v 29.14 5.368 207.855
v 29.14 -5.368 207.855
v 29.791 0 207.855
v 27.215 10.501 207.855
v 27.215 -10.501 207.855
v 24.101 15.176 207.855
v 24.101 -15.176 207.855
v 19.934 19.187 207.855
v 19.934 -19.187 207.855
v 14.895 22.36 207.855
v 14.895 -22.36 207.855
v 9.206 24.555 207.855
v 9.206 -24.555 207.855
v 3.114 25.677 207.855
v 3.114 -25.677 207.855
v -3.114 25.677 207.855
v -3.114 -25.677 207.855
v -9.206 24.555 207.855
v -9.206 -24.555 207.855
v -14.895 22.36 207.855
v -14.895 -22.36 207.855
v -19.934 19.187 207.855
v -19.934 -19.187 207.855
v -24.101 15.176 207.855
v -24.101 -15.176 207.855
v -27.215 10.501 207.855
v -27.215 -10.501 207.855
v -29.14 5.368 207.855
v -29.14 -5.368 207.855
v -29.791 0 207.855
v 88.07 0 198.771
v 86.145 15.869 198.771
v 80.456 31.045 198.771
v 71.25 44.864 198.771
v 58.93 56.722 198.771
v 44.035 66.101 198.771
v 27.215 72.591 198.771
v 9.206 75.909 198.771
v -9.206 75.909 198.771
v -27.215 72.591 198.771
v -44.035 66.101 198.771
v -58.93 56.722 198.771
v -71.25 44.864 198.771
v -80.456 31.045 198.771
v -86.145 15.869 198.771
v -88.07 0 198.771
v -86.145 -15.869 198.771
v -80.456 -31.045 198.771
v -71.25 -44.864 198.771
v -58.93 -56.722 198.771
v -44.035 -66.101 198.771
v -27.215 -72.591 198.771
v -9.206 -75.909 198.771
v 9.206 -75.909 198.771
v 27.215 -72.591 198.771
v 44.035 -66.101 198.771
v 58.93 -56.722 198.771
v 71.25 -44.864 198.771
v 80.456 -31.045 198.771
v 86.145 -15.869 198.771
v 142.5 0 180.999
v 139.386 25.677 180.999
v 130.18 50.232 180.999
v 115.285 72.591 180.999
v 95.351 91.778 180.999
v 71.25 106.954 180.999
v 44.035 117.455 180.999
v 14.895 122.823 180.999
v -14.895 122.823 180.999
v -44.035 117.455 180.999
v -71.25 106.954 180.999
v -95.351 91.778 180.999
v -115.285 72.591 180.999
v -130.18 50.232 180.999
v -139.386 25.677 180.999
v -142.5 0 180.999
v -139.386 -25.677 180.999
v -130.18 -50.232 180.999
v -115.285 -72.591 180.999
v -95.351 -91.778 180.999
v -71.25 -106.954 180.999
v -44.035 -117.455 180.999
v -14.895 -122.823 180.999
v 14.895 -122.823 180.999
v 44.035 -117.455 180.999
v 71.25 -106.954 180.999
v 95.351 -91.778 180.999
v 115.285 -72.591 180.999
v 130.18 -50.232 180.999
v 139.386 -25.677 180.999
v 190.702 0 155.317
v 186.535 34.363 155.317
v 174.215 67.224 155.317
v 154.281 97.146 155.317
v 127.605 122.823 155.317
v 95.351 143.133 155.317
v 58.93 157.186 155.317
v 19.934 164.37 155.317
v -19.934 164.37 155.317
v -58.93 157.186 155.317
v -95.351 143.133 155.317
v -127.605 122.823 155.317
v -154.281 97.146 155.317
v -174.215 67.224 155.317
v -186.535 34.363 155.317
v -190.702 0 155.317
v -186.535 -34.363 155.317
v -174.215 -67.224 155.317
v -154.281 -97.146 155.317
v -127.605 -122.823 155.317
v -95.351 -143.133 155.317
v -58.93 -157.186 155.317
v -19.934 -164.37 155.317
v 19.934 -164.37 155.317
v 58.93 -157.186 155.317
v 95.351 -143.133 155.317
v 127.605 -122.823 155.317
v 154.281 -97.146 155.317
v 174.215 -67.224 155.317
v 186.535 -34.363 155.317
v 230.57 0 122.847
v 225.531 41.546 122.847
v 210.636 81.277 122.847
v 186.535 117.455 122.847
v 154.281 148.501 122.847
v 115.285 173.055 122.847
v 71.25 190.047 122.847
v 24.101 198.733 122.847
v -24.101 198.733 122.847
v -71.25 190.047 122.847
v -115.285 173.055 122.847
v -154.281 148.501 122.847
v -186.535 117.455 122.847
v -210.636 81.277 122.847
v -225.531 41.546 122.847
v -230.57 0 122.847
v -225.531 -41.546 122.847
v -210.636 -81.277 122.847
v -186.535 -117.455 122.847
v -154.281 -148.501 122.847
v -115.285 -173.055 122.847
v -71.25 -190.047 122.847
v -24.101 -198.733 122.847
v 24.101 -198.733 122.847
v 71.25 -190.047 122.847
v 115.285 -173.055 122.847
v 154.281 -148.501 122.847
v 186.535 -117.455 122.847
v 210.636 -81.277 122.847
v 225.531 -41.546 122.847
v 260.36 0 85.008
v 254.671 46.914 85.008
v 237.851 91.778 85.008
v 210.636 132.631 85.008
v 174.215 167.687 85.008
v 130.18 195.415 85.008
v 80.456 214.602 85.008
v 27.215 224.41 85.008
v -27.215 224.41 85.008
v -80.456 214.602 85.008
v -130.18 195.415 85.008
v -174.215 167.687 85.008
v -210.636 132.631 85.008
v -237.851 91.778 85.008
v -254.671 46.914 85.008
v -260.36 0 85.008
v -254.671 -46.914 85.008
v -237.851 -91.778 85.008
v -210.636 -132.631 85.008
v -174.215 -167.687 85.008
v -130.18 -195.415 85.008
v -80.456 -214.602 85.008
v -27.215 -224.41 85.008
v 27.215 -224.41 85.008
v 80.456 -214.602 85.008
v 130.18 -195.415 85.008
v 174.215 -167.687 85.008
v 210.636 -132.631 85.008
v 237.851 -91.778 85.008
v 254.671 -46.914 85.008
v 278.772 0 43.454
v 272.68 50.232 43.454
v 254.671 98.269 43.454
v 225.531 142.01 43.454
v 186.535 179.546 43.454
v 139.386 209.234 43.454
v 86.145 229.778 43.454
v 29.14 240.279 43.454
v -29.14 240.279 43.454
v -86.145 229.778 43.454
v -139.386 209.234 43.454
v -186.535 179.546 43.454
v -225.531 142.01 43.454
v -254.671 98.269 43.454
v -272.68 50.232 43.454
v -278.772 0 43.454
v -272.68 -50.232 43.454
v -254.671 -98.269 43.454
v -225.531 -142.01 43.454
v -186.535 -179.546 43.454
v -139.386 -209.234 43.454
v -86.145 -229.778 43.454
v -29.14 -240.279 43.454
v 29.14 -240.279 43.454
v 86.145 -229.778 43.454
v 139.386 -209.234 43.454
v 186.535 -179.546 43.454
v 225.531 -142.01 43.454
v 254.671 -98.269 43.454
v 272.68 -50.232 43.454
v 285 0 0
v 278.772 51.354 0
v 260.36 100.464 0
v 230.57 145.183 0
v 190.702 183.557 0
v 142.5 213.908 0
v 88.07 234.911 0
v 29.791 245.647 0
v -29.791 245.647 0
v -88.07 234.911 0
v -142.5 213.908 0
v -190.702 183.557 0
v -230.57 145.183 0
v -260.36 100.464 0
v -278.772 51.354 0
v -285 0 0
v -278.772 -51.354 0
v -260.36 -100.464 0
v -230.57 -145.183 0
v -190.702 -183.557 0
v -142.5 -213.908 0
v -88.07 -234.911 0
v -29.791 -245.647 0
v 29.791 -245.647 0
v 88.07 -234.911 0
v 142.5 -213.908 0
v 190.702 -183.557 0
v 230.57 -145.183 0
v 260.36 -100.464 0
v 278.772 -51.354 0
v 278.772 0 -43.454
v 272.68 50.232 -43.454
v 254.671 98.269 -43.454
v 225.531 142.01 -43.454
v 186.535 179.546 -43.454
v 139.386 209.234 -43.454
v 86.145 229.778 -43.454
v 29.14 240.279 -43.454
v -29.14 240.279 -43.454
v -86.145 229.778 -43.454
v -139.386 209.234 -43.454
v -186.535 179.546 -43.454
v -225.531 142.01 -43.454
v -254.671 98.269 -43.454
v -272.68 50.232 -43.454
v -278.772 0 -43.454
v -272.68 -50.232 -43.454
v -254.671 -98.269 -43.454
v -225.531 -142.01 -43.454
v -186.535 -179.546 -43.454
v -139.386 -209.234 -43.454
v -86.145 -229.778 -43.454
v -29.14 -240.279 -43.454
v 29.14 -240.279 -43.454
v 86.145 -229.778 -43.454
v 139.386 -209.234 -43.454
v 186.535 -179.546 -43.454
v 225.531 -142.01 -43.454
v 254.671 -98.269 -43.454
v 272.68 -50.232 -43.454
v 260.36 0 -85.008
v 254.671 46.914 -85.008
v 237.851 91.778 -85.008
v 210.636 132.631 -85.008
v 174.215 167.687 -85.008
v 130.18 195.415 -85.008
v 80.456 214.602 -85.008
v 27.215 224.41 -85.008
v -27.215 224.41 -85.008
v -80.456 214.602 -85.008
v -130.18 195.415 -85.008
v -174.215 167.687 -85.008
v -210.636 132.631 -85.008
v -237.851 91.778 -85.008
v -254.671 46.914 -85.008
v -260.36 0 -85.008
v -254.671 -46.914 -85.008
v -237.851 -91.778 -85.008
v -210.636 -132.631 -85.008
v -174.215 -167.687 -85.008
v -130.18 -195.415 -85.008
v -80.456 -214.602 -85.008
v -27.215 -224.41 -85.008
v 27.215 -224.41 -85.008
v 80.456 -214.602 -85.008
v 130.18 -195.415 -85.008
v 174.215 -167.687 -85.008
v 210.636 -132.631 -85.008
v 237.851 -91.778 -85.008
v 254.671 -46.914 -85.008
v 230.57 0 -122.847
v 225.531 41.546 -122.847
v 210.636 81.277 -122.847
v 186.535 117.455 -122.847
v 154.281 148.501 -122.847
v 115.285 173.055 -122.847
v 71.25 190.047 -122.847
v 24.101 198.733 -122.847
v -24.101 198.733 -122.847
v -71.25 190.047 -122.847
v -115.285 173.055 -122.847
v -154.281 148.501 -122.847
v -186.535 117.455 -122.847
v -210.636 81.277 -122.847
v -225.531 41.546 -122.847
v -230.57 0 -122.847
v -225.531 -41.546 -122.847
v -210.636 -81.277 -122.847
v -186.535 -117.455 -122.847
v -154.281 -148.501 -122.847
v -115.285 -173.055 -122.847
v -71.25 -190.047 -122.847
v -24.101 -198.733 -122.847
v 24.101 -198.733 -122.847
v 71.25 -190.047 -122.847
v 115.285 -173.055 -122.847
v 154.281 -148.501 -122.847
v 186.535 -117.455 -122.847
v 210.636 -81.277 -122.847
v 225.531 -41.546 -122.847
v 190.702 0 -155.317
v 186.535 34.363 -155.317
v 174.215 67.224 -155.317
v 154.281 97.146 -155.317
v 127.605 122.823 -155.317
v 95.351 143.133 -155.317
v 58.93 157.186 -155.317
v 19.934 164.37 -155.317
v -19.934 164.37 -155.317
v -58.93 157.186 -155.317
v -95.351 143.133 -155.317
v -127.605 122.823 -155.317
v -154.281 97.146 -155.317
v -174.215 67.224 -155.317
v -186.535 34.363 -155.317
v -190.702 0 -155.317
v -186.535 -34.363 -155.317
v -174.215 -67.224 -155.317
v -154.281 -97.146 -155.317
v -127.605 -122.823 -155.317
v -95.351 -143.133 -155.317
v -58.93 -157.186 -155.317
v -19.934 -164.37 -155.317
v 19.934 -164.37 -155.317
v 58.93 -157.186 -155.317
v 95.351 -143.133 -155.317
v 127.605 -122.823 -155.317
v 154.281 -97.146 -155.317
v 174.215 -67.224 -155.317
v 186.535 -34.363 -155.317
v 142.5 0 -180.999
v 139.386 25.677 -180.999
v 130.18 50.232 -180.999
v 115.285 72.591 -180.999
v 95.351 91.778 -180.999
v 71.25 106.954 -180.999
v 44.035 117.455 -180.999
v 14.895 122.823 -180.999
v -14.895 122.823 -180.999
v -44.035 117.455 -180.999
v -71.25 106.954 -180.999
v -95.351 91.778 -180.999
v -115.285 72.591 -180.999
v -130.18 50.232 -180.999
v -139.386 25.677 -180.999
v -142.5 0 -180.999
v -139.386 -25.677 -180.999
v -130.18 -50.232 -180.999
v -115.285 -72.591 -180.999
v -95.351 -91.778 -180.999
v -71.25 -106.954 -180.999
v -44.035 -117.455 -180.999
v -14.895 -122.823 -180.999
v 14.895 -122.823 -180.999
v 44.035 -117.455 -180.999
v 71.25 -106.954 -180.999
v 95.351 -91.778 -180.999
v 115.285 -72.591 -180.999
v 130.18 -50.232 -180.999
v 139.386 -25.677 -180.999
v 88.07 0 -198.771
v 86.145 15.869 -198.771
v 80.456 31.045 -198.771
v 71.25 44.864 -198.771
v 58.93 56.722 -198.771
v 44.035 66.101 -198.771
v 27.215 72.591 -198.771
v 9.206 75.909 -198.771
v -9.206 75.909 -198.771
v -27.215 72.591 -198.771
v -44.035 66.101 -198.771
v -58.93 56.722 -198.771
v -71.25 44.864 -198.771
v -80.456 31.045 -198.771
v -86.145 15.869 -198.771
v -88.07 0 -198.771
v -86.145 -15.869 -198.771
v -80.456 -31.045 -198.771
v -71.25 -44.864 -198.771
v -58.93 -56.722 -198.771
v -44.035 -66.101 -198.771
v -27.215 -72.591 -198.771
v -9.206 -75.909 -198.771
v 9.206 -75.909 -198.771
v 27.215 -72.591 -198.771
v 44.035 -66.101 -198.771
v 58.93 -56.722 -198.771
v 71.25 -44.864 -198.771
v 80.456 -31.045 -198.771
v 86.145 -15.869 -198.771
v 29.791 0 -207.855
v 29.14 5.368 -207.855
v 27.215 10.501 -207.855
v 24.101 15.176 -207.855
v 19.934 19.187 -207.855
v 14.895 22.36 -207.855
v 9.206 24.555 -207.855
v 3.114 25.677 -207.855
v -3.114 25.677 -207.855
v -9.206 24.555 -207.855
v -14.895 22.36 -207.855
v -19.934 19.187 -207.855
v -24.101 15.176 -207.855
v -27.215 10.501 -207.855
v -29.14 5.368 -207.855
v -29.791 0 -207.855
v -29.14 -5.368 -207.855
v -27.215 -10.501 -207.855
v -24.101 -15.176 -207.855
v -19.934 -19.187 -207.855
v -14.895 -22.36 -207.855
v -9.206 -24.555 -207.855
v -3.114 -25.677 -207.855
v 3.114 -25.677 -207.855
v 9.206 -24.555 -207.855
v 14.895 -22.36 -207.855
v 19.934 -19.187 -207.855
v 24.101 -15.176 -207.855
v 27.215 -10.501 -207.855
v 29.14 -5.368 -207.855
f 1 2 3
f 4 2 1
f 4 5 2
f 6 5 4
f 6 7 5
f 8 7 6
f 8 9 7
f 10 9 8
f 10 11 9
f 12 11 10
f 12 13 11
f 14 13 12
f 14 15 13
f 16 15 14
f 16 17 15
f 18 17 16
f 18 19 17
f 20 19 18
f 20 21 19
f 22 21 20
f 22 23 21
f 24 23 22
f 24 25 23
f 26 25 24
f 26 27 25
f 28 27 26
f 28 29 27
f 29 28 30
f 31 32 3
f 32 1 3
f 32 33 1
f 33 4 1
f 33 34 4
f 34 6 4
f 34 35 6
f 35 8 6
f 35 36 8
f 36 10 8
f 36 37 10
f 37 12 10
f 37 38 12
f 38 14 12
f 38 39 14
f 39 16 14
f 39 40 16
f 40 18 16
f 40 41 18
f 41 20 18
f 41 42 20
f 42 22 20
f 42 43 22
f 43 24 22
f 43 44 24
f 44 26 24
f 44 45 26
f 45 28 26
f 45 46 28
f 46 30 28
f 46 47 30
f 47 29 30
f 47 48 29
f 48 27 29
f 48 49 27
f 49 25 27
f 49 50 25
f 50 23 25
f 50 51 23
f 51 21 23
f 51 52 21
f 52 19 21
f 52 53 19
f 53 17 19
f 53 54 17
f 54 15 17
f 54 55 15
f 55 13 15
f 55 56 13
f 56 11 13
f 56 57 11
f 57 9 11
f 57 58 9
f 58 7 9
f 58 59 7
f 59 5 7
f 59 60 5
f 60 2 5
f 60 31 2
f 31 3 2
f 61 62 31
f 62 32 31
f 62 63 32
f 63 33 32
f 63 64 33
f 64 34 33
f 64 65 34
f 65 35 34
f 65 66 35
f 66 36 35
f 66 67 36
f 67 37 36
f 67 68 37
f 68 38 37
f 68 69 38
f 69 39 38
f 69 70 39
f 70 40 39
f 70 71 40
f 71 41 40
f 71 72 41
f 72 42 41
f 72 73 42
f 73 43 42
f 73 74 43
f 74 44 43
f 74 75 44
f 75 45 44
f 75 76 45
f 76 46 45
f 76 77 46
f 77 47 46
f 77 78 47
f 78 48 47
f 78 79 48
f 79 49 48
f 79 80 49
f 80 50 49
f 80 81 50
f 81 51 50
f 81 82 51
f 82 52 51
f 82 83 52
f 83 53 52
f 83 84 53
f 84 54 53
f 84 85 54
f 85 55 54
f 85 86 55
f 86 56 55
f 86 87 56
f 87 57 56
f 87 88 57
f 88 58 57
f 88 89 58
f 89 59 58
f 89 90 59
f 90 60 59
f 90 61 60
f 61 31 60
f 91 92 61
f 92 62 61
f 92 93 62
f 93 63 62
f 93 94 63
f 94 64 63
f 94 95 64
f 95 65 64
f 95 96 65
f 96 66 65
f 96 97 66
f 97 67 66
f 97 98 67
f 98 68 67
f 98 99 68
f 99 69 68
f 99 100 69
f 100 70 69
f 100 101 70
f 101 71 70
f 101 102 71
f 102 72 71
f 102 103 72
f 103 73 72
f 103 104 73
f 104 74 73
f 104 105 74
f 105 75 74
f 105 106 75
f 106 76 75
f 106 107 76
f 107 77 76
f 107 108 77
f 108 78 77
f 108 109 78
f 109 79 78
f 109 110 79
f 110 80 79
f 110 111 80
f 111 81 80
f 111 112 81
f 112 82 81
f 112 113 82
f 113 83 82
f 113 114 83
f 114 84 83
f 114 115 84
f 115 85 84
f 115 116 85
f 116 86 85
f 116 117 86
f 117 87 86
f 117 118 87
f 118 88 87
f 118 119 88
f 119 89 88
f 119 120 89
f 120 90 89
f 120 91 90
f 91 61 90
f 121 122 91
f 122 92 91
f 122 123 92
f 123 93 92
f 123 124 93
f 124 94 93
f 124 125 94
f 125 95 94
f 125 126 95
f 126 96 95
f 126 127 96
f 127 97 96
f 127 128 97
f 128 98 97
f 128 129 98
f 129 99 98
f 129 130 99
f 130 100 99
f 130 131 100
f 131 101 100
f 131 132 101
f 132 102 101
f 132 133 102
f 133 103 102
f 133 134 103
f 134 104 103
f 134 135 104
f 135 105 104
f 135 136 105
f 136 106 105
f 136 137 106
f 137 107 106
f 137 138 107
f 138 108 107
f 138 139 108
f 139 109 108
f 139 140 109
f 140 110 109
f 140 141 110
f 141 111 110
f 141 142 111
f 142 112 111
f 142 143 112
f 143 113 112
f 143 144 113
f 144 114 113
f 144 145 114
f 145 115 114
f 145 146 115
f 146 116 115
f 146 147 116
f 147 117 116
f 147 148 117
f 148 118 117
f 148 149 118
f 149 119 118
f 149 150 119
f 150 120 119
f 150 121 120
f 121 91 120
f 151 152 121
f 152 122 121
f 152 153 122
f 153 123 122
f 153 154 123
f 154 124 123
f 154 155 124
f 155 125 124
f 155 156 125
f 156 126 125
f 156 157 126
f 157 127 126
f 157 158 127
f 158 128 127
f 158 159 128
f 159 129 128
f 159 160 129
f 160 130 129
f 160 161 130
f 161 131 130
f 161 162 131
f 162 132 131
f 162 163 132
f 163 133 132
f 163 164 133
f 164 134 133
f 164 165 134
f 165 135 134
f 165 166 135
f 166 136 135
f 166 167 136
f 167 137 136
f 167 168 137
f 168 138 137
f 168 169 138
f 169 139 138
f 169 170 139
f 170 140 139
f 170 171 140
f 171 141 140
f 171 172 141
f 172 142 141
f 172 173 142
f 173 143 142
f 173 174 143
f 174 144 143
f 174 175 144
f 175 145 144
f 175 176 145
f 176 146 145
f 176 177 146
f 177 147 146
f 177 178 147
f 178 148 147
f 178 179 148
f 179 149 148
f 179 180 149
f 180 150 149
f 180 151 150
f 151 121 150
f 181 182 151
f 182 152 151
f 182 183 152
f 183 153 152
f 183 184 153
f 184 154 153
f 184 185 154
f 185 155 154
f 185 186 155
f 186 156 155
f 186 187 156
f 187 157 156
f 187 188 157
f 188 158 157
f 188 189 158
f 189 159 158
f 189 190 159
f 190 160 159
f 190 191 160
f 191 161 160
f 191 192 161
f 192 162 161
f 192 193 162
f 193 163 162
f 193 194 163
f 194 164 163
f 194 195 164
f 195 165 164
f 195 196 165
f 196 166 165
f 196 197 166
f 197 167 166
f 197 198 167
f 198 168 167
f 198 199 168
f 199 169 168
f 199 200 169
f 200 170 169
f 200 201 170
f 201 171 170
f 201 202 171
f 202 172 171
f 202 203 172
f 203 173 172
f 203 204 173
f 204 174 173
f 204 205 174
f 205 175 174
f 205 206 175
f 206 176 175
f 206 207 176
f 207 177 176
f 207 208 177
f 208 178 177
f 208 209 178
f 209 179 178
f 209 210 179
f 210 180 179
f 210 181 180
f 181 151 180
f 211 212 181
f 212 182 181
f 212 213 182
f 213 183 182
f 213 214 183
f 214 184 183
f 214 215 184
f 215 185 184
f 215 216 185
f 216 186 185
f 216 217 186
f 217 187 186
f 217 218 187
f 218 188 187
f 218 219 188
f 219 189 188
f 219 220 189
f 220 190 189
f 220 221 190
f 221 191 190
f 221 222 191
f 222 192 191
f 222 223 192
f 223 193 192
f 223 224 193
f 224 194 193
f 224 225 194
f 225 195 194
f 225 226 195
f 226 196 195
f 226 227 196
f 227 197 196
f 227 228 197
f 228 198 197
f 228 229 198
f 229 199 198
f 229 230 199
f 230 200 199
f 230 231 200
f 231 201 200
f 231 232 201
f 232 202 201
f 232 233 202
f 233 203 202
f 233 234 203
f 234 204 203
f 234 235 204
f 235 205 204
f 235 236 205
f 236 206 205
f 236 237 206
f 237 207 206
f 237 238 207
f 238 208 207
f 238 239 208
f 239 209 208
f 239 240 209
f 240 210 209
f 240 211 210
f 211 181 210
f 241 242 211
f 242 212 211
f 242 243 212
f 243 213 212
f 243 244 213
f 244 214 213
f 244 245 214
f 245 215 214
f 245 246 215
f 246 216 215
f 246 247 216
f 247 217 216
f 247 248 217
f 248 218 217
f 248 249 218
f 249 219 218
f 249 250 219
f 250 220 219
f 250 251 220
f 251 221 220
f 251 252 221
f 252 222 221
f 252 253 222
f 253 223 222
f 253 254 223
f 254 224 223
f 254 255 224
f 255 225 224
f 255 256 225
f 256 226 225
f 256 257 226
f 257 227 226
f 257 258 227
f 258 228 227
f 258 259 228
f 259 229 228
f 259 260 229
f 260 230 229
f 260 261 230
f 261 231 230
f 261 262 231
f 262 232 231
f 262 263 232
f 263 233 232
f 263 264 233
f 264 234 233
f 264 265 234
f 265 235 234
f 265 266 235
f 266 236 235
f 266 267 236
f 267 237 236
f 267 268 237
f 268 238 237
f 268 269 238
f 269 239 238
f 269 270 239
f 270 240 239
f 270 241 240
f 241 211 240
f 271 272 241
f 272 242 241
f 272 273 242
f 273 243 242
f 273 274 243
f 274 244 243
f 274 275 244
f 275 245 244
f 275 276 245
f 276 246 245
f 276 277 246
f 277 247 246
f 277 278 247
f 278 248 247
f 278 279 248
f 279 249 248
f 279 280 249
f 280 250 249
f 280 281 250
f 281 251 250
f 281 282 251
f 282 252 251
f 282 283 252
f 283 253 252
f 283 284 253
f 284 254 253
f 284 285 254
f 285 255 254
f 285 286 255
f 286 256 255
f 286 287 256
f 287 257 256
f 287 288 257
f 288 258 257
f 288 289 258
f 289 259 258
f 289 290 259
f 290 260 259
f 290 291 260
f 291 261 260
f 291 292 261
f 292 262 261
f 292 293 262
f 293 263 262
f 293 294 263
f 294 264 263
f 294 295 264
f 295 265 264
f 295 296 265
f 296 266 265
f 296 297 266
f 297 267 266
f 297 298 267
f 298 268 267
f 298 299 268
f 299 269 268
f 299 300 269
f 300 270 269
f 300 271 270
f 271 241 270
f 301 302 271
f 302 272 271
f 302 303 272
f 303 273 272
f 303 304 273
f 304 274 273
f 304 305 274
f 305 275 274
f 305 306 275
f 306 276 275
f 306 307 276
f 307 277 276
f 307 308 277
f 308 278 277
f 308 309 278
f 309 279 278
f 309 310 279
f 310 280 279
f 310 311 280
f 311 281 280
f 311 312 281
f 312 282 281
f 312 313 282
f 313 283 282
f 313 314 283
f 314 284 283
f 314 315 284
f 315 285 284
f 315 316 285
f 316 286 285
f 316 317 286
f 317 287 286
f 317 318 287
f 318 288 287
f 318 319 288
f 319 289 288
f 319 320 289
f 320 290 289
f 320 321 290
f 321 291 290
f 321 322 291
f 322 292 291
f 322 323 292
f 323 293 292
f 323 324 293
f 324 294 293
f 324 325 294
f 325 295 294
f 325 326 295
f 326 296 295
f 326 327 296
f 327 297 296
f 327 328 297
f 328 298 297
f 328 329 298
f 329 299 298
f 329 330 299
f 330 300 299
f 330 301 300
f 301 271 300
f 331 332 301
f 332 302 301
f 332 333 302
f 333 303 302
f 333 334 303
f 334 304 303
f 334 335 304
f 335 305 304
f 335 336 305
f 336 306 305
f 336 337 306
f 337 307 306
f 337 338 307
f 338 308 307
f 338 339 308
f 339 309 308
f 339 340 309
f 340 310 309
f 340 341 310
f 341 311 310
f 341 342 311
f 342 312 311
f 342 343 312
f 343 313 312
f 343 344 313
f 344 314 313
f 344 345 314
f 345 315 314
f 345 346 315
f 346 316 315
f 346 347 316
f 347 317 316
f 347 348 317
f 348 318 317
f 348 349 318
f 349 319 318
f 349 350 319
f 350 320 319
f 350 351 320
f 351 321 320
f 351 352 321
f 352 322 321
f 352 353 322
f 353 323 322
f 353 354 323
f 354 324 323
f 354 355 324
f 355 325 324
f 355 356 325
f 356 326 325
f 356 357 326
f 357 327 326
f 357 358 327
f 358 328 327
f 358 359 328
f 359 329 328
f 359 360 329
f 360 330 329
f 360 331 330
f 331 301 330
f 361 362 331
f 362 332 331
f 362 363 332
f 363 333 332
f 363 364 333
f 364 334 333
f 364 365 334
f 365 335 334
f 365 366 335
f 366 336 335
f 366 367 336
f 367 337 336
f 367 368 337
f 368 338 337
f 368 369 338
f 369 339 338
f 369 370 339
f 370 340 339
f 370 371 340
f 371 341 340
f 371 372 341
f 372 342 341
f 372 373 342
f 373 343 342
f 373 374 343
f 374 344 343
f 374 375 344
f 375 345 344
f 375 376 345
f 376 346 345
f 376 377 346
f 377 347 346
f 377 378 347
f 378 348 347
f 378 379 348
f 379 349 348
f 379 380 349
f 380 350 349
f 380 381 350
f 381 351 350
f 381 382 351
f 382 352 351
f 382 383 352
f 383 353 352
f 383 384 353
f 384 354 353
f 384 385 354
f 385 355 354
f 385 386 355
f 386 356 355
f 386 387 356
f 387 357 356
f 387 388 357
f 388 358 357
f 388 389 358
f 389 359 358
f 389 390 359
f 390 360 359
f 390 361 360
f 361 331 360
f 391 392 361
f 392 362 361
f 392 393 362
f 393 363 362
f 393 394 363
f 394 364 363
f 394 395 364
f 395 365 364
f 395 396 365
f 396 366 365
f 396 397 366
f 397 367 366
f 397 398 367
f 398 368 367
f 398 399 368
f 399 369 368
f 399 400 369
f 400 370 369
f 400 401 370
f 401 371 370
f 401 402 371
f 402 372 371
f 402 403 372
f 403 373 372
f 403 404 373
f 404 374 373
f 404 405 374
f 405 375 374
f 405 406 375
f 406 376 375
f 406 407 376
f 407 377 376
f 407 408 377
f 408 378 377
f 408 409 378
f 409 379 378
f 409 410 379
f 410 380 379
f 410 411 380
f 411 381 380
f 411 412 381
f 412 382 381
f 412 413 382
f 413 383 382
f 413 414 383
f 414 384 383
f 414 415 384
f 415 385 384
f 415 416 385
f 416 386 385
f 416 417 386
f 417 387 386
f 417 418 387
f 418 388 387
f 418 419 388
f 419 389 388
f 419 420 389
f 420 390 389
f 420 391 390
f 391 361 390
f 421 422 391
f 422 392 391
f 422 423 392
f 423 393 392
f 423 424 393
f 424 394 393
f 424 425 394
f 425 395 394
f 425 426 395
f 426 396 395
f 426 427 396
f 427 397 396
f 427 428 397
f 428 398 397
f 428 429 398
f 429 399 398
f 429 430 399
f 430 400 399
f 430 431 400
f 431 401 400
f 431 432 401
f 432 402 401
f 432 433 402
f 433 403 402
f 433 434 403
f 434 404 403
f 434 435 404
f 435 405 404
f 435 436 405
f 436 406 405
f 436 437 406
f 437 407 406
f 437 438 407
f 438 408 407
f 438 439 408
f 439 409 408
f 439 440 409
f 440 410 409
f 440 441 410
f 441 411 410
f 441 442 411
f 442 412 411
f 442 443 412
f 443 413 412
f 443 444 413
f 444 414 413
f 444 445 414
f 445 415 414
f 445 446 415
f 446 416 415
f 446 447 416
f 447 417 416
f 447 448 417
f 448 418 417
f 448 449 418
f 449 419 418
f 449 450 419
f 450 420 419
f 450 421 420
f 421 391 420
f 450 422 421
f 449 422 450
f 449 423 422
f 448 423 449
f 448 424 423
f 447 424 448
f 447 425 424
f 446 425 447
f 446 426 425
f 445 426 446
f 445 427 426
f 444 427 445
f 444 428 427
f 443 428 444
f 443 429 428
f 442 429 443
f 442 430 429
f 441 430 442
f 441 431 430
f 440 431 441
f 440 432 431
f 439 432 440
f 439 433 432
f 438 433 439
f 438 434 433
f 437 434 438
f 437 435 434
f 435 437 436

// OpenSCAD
// Generated by SolidPython 1.0.1 on 2020-07-29 00:46:52


scale(v = [15, 13, 11]) {
	sphere(r = 19);
}
/***********************************************
*********      SolidPython code:      **********
************************************************
 
# import packages: SolidPython
from solid import *
from solid.utils import *
from itertools import chain, combinations, permutations


class Resize:

    def __init__(self, scad_file):
        self.scad_file = scad_file
        #self.scad_file = import_scad(scad_file)
        # cone/cylinder param:
        self.r1 = 0
        self.r2 = 0
        self.h = 0
        # rectangular prism param:
        self.w = 0
        self.l = 0
        # ellipse param:
        self.r = 0

    # import OpenScad code (file name corresponds to shape)


    # classify shape + parameters
    def assign(self, param1, param2, param3):
        if self.scad_file == 'cone.scad':
            self.r1 = param1
            self.r2 = param2
            self.h = param3
        elif self.scad_file == 'cylinder.scad':
            self.r1 = param1
            self.r2 = param2
            self.h = param3
        elif self.scad_file == 'rectangularPrism.scad':
            self.h = param1
            self.l = param2
            self.w = param3
        else:
            self.r = param1
            self.h = param2

    # resize parameters
    def iterate(self):
        x = range(3, 20, 2)
        i = 1
        if self.scad_file == 'cone.scad':
            tempList = list(permutations(x, 2))
            for temp in tempList:
                param1 = temp[0]
                param2 = temp[1]
                filepath = 'produced_scad_files/' + 'cone' + str(param1) + '_' + str(param2) + '_' + '.scad'
                scad_render_to_file(cylinder(h=param1, r1=param2, r2=0), filepath)

        elif self.scad_file == 'cylinder.scad':
            tempList = list(permutations(x, 3))
            for temp in tempList:
                param1 = temp[0]
                param2 = temp[1]
                filepath = 'produced_scad_files/' + 'cylinder' + str(param1) + '_' + str(param2) + '_' + '.scad'
                scad_render_to_file(cylinder(h=param1, r1=param2, r2=param2), filepath)

        elif self.scad_file == 'rectangularPrism.scad':
            tempList = list(permutations(x, 3))
            for temp in tempList:
                param1 = temp[0]
                param2 = temp[1]
                param3 = temp[2]
                filepath = 'produced_scad_files/' + 'rectangularPrism' + str(param1) + '_' + str(param2) + '_' + str(
                    param3) + '.scad'
                scad_render_to_file(cube(size=(param1, param2, param3)), filepath)

        elif self.scad_file == 'ellipse.scad':
            tempList = list(permutations(x, 4))
            for temp in tempList:
                param1 = temp[0]
                param2 = temp[1]
                param3 = temp[2]
                param4 = temp[3]
                filepath = 'produced_scad_files/' + 'ellipse' + str(param1) + '_' + str(param2) + '_' + str(param3) + '_' + str(param4) + '.scad'
                scad_render_to_file(scale([param1, param2, param3])(sphere(r=param4)), filepath)

    def render_to_scadfile(self):
        scad_render_to_file(scad, 'example.scad') 
 
************************************************/
